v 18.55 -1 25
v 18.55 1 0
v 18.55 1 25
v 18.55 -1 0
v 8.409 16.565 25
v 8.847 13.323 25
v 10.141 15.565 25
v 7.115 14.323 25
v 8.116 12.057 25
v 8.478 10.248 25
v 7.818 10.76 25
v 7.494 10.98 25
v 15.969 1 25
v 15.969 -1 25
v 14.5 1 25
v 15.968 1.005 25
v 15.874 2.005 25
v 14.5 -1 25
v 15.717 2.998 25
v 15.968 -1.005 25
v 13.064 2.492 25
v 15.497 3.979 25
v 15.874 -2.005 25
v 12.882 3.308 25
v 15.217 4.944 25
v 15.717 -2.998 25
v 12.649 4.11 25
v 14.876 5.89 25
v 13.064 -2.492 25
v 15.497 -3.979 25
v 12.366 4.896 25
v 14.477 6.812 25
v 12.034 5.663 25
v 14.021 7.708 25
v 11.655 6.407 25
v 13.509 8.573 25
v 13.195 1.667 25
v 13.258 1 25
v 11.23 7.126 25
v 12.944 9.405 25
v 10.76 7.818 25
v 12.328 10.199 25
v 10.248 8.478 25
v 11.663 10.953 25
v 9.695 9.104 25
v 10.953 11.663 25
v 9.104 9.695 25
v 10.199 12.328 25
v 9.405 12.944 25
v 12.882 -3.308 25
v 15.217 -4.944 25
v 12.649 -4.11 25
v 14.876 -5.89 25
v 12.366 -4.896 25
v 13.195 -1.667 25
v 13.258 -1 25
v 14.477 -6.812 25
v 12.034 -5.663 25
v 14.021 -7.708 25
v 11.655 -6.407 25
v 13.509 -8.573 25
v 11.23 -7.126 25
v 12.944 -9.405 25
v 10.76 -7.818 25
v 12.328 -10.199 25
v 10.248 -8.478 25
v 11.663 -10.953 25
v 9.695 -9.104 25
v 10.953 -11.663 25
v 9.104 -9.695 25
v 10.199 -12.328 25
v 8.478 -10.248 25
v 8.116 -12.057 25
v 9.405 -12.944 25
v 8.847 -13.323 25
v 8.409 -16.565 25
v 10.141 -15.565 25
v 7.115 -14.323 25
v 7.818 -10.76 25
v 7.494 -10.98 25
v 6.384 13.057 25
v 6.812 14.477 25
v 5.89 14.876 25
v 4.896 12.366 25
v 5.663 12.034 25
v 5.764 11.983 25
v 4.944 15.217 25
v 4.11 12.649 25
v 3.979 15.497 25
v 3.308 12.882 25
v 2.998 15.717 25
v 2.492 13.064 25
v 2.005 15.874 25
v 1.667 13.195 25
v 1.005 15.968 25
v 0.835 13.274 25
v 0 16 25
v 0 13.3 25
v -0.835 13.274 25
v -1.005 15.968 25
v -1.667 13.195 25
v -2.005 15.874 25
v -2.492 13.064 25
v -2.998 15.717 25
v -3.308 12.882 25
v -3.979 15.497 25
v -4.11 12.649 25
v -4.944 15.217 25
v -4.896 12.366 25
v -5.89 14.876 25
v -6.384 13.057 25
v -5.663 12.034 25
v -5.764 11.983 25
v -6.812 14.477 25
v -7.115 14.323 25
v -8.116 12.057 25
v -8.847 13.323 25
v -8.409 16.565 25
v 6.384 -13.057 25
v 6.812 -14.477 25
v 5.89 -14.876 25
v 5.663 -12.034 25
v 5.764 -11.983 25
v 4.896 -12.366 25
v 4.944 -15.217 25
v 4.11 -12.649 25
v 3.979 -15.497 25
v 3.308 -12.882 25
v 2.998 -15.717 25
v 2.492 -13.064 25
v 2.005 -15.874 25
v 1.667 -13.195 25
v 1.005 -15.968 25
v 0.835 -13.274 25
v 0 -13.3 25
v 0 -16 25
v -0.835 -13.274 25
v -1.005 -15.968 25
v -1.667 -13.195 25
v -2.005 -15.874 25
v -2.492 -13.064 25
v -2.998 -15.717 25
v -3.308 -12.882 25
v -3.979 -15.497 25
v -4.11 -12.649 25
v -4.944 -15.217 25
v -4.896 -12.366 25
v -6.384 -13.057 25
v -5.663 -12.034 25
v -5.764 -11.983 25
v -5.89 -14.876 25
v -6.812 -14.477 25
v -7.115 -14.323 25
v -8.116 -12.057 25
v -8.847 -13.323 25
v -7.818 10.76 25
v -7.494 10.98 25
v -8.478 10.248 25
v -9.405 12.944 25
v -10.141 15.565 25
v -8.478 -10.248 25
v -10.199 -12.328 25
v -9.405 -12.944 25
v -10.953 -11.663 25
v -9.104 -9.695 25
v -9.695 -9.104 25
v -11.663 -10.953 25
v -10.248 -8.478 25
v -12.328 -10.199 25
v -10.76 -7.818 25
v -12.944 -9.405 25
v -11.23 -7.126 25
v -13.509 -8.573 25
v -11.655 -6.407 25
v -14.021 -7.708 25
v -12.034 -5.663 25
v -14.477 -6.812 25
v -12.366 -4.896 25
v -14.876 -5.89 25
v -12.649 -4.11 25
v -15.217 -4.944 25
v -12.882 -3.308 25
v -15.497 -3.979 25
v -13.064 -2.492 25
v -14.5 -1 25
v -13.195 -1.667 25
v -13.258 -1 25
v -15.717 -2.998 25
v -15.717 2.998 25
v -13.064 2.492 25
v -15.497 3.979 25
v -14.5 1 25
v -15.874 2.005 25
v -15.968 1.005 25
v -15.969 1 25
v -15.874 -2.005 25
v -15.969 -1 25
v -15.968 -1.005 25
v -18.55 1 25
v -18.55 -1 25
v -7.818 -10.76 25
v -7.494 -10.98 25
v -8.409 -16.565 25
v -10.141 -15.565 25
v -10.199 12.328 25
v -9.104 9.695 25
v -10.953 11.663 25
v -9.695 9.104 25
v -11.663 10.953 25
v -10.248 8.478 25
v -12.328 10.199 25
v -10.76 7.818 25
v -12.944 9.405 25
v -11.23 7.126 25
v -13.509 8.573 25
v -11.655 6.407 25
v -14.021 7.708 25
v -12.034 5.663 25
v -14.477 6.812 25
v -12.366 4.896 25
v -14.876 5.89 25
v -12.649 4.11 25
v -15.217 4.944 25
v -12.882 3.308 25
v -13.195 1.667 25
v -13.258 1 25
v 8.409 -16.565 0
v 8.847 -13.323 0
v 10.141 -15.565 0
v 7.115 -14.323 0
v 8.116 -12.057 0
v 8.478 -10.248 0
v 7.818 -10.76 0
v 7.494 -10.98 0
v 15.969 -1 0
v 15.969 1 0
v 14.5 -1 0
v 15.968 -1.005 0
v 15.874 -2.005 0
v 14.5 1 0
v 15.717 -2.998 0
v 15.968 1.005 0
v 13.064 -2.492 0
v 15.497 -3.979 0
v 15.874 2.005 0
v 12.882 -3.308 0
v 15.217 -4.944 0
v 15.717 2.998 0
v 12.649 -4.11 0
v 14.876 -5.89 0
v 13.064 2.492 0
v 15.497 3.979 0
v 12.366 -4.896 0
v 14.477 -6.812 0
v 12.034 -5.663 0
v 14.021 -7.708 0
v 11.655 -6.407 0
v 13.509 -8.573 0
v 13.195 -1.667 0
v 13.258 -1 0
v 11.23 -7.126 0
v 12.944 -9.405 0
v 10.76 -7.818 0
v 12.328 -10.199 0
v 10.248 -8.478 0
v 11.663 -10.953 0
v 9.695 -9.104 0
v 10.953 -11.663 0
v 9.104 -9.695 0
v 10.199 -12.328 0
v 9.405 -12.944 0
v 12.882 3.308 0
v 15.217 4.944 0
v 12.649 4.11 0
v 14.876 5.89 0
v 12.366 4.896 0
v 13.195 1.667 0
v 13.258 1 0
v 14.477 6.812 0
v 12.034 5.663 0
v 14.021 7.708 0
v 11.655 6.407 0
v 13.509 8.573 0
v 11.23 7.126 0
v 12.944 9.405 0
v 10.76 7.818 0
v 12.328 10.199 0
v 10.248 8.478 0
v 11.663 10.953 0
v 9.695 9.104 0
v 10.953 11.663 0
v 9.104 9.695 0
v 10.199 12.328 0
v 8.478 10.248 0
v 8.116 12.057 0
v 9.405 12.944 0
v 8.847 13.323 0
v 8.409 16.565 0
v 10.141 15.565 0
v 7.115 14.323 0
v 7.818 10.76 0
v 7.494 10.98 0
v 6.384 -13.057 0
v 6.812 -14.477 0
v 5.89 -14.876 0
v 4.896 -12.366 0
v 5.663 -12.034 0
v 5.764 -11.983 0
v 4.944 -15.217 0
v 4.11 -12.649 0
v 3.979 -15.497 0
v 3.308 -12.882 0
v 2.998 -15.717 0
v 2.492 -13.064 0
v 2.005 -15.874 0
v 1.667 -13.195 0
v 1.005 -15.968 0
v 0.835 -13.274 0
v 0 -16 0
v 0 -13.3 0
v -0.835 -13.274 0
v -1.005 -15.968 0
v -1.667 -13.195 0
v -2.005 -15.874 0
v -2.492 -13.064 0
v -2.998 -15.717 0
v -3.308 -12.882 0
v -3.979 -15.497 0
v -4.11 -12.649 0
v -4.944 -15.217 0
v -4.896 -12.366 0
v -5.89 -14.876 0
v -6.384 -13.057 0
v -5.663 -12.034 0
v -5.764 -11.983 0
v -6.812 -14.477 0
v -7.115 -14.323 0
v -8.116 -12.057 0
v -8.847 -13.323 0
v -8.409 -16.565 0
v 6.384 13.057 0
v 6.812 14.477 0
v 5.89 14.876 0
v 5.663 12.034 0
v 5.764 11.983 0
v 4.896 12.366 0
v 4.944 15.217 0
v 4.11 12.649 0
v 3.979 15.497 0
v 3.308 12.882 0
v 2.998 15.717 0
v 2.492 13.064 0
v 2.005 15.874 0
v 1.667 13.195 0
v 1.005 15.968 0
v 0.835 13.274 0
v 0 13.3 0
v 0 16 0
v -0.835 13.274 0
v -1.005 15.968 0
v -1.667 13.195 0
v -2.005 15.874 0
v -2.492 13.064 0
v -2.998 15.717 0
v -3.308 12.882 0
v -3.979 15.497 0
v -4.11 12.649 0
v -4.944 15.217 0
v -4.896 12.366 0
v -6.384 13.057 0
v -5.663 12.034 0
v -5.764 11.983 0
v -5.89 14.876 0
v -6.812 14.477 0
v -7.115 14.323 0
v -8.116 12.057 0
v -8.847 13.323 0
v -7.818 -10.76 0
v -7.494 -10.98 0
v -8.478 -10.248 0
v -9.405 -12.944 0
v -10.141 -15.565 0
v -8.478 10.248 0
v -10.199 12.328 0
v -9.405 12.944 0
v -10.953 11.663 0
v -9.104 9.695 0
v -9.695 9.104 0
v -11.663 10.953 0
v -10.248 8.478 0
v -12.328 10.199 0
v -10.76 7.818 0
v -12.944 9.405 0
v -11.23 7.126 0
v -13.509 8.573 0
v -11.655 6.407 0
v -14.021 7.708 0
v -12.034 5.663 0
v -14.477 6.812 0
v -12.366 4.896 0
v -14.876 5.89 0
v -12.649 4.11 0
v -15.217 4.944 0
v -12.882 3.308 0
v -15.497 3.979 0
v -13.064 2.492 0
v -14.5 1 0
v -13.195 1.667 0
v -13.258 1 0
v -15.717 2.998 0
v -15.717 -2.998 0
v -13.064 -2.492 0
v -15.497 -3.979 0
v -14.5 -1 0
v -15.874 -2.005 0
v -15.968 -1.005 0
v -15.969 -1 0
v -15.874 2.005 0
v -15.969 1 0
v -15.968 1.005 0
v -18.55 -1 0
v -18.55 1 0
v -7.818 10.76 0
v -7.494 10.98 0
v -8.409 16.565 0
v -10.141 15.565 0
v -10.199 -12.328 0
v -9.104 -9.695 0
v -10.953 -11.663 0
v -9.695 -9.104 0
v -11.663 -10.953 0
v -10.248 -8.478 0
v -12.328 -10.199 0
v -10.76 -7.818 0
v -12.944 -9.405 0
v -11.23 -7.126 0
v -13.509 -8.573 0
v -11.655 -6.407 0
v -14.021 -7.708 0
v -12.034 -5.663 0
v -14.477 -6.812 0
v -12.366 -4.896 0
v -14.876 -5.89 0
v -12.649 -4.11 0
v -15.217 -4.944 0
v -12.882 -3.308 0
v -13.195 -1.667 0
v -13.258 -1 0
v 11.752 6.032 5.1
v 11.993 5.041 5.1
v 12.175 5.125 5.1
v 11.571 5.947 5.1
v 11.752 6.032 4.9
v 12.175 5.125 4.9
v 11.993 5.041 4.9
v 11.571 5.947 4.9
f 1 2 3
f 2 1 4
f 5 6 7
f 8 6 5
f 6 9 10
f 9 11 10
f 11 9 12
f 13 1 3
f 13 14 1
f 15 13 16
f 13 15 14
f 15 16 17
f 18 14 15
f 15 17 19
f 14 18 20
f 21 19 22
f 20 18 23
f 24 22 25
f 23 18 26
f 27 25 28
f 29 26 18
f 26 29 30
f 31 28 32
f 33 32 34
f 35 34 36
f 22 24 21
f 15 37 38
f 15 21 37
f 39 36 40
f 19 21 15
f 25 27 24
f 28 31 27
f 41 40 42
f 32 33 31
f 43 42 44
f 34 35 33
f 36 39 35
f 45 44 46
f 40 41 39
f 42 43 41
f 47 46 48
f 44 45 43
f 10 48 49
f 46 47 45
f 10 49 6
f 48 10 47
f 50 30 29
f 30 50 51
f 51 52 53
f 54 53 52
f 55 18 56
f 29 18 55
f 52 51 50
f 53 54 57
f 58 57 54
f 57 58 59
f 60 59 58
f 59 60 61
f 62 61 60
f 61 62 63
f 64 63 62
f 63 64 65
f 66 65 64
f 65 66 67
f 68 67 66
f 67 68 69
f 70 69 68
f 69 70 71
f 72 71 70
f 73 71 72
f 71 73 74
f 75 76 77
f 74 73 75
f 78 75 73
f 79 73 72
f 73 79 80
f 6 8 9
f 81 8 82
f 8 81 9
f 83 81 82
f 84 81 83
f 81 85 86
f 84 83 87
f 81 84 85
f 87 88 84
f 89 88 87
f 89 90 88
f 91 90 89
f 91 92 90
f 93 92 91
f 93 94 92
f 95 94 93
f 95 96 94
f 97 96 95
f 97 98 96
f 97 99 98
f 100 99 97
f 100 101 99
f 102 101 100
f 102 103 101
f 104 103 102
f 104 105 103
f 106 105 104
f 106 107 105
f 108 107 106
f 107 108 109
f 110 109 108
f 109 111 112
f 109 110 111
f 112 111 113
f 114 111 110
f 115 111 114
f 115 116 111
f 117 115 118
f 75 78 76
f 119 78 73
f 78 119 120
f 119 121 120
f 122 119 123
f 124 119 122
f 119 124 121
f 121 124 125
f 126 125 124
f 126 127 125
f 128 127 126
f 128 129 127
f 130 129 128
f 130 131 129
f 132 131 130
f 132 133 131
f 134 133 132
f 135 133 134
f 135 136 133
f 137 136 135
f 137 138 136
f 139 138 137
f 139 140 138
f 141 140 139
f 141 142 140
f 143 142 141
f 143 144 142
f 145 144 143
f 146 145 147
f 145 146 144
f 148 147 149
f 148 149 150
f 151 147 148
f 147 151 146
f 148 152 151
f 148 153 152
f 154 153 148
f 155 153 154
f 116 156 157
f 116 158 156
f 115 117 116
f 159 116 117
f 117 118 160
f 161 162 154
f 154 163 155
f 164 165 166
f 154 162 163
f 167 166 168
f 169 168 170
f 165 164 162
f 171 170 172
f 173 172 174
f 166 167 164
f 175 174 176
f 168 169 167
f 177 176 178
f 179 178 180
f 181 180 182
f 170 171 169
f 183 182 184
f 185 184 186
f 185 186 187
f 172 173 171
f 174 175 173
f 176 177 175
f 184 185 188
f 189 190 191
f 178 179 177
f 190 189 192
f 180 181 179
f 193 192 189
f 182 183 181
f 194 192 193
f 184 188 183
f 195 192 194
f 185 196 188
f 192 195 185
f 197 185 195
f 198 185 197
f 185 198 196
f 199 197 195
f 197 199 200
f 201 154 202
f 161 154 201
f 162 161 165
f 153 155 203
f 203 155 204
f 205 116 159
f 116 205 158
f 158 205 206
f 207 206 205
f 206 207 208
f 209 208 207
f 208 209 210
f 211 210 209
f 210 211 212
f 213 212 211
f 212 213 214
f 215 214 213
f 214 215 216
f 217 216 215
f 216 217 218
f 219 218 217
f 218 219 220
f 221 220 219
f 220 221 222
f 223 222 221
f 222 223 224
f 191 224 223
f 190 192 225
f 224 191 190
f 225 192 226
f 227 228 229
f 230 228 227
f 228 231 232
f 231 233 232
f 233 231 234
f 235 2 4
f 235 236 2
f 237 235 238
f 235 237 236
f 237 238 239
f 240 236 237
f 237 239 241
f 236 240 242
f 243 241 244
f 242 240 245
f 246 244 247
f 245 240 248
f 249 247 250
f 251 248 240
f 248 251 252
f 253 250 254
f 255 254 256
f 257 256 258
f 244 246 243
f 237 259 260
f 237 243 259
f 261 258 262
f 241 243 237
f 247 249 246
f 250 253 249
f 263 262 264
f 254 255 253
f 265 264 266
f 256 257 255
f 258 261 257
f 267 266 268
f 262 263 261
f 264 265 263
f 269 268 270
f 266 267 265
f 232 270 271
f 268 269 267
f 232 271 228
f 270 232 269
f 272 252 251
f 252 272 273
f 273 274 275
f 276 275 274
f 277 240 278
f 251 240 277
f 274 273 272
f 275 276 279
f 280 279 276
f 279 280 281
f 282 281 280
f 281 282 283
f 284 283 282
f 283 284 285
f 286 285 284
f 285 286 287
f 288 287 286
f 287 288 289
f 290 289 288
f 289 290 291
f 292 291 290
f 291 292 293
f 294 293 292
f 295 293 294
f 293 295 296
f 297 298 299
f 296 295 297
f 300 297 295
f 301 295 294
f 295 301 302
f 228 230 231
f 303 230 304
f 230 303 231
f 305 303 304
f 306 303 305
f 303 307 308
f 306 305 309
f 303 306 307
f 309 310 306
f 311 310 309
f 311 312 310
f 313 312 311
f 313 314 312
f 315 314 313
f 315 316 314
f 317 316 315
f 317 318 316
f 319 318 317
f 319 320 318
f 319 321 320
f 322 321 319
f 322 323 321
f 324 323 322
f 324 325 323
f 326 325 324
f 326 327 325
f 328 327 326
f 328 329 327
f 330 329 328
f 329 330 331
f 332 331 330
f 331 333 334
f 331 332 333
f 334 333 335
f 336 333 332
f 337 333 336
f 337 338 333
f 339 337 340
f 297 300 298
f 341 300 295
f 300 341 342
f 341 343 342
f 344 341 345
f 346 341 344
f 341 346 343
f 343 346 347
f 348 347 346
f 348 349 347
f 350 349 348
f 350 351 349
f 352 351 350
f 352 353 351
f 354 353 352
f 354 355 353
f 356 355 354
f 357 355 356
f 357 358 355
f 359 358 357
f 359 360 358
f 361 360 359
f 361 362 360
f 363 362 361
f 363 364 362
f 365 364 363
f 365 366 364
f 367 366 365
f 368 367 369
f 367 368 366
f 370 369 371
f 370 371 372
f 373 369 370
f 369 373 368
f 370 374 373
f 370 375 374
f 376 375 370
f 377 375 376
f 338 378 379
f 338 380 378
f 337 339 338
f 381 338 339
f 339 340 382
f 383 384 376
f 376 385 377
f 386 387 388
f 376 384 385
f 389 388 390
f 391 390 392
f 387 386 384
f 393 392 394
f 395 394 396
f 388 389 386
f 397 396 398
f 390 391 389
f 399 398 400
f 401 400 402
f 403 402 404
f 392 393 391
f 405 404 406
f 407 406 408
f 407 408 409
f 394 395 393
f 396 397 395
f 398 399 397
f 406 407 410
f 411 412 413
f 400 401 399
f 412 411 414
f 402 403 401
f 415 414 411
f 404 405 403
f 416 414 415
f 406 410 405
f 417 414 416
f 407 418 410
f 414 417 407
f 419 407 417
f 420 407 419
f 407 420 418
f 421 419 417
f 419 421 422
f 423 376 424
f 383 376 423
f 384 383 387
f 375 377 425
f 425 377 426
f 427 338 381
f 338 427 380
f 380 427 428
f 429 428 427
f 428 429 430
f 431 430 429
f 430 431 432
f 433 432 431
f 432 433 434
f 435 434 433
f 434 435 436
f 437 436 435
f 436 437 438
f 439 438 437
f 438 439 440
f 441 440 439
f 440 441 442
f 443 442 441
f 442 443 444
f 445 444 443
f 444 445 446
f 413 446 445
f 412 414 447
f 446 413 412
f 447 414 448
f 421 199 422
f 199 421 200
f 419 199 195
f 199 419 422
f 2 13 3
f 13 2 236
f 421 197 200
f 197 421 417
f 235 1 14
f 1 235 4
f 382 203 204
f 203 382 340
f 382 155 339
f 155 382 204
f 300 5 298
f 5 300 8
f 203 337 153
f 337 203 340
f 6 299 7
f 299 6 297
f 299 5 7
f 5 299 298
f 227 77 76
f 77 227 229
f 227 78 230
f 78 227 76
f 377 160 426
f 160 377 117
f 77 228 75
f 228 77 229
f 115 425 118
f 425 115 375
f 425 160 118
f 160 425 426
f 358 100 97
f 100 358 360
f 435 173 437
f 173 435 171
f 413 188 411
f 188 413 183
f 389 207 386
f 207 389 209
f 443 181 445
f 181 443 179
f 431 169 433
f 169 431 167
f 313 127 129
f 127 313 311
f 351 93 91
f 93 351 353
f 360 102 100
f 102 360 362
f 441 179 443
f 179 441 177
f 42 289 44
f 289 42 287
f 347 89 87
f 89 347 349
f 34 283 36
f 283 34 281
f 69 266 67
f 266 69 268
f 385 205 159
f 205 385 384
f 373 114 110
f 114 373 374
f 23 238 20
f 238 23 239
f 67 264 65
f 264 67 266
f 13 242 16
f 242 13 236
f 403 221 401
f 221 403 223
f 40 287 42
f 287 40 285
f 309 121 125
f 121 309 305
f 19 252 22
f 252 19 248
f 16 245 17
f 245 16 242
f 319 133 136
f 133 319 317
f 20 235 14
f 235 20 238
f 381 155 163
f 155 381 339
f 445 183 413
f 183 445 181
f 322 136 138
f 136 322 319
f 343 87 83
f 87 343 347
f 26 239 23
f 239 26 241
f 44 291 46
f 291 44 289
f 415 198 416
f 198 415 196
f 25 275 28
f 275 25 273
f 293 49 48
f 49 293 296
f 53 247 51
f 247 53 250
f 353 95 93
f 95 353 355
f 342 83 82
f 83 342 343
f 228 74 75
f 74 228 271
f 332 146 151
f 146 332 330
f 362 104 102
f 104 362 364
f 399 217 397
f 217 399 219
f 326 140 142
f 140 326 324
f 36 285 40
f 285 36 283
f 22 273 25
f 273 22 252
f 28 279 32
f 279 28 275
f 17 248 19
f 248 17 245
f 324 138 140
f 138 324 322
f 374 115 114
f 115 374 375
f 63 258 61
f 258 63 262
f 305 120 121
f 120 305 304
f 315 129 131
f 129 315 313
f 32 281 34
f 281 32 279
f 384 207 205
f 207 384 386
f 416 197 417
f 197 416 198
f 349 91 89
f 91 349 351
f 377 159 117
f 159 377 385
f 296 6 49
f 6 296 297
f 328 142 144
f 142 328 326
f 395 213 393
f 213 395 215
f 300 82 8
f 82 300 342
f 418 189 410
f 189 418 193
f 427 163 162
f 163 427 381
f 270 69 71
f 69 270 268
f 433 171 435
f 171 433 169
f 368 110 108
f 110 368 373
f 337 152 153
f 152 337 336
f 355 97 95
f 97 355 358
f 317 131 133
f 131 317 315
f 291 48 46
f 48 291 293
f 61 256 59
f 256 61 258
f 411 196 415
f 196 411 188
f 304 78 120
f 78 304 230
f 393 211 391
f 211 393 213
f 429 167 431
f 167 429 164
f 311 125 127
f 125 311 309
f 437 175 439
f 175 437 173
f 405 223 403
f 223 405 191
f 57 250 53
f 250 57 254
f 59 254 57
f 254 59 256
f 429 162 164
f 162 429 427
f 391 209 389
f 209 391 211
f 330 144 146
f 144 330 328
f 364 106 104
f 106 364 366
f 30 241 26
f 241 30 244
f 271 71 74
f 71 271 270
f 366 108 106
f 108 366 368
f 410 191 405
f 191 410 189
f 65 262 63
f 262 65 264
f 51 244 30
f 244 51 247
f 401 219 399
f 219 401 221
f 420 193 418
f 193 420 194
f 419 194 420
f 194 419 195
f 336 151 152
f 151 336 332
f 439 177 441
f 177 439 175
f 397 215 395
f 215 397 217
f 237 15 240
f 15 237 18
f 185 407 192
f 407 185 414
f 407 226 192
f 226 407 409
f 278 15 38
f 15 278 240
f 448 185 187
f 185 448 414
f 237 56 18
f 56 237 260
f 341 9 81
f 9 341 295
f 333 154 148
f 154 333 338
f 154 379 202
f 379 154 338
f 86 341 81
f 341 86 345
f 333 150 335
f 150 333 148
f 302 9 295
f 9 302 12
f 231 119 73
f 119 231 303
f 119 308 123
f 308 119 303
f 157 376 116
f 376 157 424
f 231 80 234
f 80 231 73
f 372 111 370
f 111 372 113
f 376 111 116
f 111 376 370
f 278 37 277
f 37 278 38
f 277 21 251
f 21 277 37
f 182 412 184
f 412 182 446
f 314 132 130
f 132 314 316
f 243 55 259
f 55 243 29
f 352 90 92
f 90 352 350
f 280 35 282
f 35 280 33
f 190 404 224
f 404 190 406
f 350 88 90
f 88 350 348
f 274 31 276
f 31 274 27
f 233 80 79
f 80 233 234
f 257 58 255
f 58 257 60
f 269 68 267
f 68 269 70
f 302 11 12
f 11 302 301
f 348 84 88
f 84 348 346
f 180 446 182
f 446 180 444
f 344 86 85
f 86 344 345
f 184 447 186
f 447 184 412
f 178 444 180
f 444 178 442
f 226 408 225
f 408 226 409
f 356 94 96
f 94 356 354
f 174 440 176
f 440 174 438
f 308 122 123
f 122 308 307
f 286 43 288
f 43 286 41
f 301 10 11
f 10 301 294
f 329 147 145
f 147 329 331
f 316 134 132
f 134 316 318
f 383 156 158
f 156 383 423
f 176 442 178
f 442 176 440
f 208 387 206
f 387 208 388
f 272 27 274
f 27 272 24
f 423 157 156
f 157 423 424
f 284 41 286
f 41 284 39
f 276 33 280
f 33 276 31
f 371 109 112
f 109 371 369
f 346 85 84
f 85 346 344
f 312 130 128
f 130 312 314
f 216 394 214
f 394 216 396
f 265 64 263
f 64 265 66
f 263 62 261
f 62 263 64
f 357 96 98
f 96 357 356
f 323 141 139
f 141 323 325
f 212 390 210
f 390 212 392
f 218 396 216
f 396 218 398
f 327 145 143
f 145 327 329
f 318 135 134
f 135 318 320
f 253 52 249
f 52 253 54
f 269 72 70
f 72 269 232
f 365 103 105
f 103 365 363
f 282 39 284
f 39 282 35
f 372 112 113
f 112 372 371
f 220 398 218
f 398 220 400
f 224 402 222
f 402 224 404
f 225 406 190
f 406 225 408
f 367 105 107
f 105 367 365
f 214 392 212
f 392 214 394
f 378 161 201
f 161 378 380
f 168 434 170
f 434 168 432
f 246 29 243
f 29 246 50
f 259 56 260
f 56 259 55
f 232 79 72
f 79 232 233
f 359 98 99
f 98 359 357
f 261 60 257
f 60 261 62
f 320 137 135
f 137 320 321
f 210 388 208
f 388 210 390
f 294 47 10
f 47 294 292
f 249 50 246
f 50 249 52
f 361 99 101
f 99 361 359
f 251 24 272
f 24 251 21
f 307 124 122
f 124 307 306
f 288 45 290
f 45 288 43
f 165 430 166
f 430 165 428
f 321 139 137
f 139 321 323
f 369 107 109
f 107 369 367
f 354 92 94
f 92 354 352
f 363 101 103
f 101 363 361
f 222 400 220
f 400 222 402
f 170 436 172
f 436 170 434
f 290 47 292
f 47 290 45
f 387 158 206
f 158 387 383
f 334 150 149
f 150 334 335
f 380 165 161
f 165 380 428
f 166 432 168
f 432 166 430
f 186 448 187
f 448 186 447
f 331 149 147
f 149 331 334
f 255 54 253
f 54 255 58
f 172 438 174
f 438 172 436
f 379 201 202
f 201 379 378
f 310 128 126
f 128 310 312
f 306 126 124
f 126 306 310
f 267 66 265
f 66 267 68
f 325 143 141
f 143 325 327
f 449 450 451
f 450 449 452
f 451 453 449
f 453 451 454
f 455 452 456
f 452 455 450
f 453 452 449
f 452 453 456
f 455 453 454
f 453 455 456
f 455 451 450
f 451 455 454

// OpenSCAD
inner_dia = 26.6;
inner_cutout_dia = 28.3;// ????
inner_fin_dia = 29;

height = 25;
fin_width = 2;
fin_count = 6;
total_dia = 37.1;
outer_dia = 32;

notch_depth = .2;
notch_width = 1;
notch_height = 5;

difference () {
    union() {
        cylinder (h = height, d=outer_dia, center = false, $fn=100);
        for (a = [0: 360 / fin_count : 179]) {
            rotate (a) {
                translate([-total_dia / 2, -fin_width / 2, 0]) {
                    cube ([total_dia, fin_width, height]);
                }
            }
        }
    }
    // Remove the main inner cylinder
    cylinder (h = height*3, d=inner_dia, center = true, $fn=100);
    // Remove the inner fins
    for (a = [0: 360 / fin_count : 179]) {
        rotate (a) {
            translate([-inner_fin_dia / 2, -fin_width / 2, 0]) {
                cube ([inner_fin_dia, fin_width, height]);
            }
        }
    }
}

color("Blue"){
rotate(25) {translate([(inner_dia / 2)-notch_depth, 0, notch_height]) {
    cube([notch_depth, notch_width, notch_depth], center=true);
    }
}}
